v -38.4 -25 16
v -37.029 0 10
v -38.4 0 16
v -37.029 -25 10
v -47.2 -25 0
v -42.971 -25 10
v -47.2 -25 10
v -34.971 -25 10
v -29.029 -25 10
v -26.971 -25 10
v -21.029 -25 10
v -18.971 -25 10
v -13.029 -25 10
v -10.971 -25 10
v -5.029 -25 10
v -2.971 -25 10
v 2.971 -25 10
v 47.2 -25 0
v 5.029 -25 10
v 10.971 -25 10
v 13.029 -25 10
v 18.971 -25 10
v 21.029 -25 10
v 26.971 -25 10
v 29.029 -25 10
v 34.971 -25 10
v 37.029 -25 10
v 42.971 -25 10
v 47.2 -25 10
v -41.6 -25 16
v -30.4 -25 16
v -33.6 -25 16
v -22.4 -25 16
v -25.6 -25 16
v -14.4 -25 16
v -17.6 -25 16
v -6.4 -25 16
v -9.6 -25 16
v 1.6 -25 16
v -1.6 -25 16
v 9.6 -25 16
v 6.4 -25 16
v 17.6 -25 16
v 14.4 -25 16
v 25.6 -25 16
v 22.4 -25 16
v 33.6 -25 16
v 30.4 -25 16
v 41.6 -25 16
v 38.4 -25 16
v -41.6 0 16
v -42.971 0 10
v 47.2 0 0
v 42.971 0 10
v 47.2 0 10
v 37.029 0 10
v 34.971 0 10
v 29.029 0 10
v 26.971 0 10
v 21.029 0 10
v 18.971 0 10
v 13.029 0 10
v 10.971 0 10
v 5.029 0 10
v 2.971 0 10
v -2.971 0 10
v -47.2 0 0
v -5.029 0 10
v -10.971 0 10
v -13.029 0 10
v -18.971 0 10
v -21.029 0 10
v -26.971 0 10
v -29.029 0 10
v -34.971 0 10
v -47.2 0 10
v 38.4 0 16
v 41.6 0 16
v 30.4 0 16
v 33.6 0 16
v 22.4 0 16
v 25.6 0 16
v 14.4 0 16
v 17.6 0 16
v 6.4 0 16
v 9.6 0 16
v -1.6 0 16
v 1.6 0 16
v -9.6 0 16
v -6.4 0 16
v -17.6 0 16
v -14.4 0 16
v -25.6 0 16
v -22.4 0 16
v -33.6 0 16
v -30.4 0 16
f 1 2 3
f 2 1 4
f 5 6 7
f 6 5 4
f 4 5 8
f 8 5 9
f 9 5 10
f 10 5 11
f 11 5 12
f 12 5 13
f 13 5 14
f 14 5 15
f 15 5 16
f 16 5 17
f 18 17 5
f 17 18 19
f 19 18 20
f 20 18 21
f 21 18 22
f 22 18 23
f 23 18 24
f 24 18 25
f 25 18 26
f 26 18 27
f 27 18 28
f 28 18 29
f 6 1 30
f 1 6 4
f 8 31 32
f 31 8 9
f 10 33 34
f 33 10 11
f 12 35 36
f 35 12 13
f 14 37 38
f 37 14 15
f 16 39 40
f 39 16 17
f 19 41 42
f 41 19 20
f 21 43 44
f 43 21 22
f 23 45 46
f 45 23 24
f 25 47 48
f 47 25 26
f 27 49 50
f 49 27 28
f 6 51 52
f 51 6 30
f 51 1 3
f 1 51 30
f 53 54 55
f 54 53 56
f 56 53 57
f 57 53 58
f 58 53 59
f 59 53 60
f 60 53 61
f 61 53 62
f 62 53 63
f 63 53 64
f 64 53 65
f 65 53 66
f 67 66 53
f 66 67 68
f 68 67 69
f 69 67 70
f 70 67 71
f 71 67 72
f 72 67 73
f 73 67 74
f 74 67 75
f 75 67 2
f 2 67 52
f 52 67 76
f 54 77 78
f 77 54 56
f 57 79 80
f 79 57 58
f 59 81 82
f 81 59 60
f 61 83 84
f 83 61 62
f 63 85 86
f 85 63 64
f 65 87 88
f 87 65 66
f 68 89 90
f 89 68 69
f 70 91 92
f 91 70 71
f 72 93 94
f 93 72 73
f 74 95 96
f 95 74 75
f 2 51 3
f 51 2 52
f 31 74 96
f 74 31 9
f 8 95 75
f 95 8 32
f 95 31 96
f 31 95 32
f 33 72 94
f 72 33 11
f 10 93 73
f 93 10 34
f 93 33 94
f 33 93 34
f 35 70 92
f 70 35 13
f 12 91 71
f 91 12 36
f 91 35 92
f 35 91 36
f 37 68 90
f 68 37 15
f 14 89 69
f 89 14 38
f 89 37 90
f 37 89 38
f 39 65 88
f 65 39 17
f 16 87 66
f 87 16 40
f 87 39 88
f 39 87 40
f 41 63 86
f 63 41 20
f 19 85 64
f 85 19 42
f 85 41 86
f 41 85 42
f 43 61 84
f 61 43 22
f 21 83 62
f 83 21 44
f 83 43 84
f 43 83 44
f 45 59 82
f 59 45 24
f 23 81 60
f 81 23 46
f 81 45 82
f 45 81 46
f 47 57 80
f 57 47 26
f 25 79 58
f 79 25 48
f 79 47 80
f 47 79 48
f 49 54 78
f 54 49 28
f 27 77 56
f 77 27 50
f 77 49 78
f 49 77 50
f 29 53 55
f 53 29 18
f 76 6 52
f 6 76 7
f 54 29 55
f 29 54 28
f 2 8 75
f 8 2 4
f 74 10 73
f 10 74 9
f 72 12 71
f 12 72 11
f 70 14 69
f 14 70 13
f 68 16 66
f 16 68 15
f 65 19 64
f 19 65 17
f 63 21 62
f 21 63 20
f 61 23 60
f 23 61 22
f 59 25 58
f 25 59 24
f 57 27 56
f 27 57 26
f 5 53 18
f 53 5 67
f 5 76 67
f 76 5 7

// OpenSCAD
$fn = 32;

// ----------------------------------------------------------------------
// Toothed rack, 11 teeth
// 8 mm pitch, 6 mm teeth
// ----------------------------------------------------------------------

// --- parameters (mm) ---
bar_w = 25;     // bar width (Y)
bar_h = 10;     // bar height (Z)
teeth = 11;     // number of teeth
pitch = 8;      // tooth pitch
tooth_h = 6;    // tooth height above the bar
root_w = 6.4;   // tooth width at the root
crest_w = 3.2;  // tooth width at the crest

// --- derived feature positions (mm) ---
span = (teeth - 1) * pitch;  // = 80   distance between the outer teeth
bar_l = span + root_w + 8;   // = 94.4   bar length: teeth plus 4 mm at each end
tooth_x = -span / 2;         // = -40   X of the first tooth
height = bar_h + tooth_h;    // = 16   overall height
feature_centers = [
  [tooth_x + 0 * pitch, -bar_w / 2],
  [tooth_x + 1 * pitch, -bar_w / 2],
  [tooth_x + 2 * pitch, -bar_w / 2],
  [tooth_x + 3 * pitch, -bar_w / 2],
  [tooth_x + 4 * pitch, -bar_w / 2],
  [tooth_x + 5 * pitch, -bar_w / 2],
  [tooth_x + 6 * pitch, -bar_w / 2],
  [tooth_x + 7 * pitch, -bar_w / 2],
  [tooth_x + 8 * pitch, -bar_w / 2],
  [tooth_x + 9 * pitch, -bar_w / 2],
  [tooth_x + 10 * pitch, -bar_w / 2]
];   // tooth centre line, drives the tooth loop

// bar with a rack of teeth, one extruded trapezoium per centre
module rack_tooth() {
  linear_extrude(height = bar_w)
    polygon(points = [
      [0, 0],
      [root_w, 0],
      [root_w / 2 + crest_w / 2, tooth_h + 1],
      [root_w / 2 - crest_w / 2, tooth_h + 1]
    ]);
}

union() {
  translate([-bar_l / 2, -bar_w, 0]) cube([bar_l, bar_w, bar_h]);
  for (centre = feature_centers)
    translate([centre[0] - root_w / 2, 0, bar_h - 1]) rotate([90, 0, 0]) rack_tooth();
}
